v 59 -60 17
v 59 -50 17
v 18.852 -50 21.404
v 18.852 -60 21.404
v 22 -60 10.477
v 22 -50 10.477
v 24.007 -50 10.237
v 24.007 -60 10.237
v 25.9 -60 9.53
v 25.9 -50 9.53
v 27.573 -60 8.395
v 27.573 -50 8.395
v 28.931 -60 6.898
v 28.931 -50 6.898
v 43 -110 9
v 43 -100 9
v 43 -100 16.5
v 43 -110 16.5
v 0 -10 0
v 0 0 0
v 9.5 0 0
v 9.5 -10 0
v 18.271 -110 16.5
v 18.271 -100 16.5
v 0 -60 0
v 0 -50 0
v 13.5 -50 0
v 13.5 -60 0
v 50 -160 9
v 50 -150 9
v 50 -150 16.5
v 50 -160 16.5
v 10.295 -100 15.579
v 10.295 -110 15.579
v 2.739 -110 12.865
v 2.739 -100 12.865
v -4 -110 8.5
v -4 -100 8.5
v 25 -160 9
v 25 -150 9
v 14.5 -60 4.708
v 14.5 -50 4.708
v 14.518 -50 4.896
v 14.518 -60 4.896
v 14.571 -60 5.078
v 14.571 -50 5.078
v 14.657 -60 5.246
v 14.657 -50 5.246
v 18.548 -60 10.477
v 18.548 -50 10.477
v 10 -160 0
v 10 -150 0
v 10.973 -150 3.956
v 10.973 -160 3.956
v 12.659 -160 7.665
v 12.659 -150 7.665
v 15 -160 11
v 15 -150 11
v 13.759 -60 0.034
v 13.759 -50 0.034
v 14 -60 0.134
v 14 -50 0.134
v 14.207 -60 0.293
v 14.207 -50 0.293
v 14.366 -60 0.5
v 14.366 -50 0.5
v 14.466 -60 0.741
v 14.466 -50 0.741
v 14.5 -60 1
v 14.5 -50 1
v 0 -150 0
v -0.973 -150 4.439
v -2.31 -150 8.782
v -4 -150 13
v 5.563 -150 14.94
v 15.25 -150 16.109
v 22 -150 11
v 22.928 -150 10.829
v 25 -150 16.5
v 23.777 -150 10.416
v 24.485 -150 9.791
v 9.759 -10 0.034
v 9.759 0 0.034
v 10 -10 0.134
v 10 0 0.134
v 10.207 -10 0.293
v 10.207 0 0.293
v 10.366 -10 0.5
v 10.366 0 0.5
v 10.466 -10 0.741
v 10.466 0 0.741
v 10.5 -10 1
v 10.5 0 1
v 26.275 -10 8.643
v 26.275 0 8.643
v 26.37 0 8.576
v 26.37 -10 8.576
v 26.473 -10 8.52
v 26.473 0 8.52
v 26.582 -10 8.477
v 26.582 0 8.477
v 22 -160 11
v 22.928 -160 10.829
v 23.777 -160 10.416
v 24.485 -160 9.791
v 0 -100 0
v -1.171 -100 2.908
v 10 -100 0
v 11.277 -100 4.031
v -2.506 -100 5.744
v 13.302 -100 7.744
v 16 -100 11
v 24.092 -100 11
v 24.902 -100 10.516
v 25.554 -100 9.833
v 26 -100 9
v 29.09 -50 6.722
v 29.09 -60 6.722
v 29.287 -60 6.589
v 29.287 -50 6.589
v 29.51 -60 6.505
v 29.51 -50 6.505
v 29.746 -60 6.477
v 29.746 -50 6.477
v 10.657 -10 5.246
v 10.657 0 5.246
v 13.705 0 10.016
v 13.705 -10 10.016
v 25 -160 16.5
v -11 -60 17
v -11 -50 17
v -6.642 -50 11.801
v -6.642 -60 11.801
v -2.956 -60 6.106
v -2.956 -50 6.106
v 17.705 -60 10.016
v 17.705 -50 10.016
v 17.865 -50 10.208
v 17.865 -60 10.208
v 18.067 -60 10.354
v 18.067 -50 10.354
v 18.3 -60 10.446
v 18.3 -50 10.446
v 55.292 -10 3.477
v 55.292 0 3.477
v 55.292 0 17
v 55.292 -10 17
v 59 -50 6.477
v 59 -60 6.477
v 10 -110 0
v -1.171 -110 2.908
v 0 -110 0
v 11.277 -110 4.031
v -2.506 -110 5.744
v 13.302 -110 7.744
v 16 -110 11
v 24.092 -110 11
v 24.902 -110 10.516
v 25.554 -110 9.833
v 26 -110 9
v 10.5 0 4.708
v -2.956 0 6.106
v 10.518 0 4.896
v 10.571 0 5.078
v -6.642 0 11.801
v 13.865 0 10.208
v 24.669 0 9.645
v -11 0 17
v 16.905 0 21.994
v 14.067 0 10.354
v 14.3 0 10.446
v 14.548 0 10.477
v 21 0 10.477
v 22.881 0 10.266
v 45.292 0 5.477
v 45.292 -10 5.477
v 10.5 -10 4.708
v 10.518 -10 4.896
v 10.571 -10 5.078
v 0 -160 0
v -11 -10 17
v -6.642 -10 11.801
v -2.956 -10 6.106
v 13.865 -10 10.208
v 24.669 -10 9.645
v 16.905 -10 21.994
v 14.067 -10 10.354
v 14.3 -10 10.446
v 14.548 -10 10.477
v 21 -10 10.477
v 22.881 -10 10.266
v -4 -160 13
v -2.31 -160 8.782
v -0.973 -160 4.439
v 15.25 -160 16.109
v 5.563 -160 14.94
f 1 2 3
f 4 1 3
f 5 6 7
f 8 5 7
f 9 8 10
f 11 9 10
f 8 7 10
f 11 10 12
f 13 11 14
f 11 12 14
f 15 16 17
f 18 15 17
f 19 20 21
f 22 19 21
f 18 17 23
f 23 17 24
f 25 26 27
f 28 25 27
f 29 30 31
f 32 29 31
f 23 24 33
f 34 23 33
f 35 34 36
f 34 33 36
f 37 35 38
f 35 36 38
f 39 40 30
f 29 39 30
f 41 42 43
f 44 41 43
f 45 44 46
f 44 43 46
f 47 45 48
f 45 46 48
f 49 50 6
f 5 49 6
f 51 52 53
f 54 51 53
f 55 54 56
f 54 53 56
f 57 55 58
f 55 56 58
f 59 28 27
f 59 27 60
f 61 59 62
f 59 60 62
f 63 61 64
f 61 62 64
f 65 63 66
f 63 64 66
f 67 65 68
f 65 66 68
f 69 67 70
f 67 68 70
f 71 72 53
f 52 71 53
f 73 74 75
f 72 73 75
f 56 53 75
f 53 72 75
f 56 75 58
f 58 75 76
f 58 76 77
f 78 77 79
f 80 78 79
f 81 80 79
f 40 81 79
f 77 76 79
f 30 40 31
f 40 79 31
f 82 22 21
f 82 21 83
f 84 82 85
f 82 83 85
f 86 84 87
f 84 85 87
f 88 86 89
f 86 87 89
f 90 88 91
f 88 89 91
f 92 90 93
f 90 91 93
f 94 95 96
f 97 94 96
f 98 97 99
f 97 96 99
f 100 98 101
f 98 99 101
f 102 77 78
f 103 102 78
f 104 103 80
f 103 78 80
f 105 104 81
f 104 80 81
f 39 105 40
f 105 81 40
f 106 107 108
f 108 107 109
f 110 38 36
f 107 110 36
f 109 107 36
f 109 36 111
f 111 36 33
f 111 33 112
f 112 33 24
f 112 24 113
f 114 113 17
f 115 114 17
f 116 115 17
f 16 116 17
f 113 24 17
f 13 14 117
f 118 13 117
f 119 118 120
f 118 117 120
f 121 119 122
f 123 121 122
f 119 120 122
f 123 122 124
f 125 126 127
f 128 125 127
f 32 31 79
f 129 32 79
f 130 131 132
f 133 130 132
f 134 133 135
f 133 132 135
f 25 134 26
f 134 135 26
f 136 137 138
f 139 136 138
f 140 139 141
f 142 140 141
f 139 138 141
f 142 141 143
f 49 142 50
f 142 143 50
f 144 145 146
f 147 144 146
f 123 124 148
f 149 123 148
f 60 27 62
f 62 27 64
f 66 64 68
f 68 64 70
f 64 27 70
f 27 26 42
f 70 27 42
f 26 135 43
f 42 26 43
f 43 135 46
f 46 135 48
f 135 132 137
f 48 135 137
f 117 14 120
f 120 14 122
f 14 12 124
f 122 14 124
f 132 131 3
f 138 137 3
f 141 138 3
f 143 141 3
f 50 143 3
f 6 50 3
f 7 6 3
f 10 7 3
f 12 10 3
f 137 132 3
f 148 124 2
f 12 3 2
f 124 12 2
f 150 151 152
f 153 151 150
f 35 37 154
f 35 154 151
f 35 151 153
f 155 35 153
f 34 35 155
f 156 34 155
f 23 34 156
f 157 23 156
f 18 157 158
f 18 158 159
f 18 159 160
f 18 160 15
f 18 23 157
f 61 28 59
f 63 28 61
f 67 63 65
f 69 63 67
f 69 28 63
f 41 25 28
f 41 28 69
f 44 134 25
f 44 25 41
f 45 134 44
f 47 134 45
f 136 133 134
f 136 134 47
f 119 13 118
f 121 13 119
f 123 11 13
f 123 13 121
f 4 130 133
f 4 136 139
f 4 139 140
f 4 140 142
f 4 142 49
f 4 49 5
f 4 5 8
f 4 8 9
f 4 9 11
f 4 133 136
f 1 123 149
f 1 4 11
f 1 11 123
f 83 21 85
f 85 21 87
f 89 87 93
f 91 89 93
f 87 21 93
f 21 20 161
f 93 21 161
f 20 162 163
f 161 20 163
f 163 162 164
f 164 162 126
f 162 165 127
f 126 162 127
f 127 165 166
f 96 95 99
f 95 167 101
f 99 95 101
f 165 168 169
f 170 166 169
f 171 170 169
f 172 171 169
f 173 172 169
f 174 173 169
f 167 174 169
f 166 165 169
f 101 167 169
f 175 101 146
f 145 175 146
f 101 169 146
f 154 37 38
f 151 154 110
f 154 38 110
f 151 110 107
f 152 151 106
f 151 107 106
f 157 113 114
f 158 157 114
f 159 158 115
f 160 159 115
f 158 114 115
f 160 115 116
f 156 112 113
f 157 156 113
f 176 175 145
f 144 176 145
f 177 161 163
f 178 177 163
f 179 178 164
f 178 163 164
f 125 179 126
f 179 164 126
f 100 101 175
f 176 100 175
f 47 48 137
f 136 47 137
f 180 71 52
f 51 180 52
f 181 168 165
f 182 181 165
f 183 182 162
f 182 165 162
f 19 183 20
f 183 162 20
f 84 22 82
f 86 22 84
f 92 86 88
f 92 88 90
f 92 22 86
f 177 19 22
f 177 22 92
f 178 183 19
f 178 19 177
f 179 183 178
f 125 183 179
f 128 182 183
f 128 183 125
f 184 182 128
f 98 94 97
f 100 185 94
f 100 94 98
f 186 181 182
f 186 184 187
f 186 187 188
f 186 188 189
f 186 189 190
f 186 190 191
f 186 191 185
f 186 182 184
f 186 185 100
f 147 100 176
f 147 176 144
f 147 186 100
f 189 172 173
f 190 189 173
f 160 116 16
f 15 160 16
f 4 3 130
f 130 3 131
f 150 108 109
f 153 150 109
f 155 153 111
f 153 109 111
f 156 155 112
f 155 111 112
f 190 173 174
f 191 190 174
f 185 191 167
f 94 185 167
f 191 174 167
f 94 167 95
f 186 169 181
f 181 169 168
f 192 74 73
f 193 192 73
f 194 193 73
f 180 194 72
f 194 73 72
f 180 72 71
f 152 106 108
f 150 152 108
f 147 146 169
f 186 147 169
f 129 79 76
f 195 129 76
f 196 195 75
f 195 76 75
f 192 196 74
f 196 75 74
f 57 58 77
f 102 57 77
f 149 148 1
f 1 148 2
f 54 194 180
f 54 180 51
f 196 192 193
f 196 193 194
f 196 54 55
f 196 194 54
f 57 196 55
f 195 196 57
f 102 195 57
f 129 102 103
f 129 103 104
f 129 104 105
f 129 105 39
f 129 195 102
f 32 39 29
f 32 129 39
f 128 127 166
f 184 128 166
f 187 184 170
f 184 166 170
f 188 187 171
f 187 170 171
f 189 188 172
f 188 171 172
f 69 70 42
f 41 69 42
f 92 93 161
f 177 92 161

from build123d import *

# Parameters (mm, degrees)
F1_DEPTH  = 10
F4_DEPTH  = 10
F7_DEPTH  = 10
F10_DEPTH = 10


with BuildPart() as f1:
    # F0 (on Front) → F1 (new body)
    with BuildSketch(Plane.XZ):
        with BuildLine():
            ThreePointArc((-11, 17), (-4.710931, 9.010574), (0, 0))
            Line((0, 0), (9.5, 0))
            ThreePointArc((9.5, 0), (10.207107, 0.292893), (10.5, 1))
            Line((10.5, 1), (10.5, 4.707779))
            ThreePointArc((10.5, 4.707779), (10.540143, 4.988269), (10.65735, 5.24624))
            Line((10.65735, 5.24624), (13.705072, 10.015687))
            ThreePointArc((13.705072, 10.015687), (14.067338, 10.354284), (14.547723, 10.477226))
            Line((14.547723, 10.477226), (21, 10.477226))
            ThreePointArc((21, 10.477226), (23.792353, 10.005474), (26.274753, 8.642582))
            ThreePointArc((26.274753, 8.642582), (26.420907, 8.546435), (26.581581, 8.47723))
            Line((26.581581, 8.47723), (45.291543, 5.47723))
            Line((45.291543, 5.47723), (55.291543, 3.47723))
            Line((55.291543, 3.47723), (55.291543, 17))
            Line((55.291543, 17), (16.90484, 21.994406))
            Line((16.90484, 21.994406), (-11, 17))
        make_face()
    extrude(amount=F1_DEPTH)


with BuildPart() as f4:
    # F3 (on offset) → F4 (new body)
    with BuildSketch(Plane.XZ.offset(50)):
        with BuildLine():
            ThreePointArc((-11, 17), (-4.710931, 9.010574), (0, 0))
            Line((0, 0), (13.5, 0))
            ThreePointArc((13.5, 0), (14.207107, 0.292893), (14.5, 1))
            Line((14.5, 1), (14.5, 4.707779))
            ThreePointArc((14.5, 4.707779), (14.540143, 4.988269), (14.65735, 5.24624))
            Line((14.65735, 5.24624), (17.705072, 10.015687))
            ThreePointArc((17.705072, 10.015687), (18.067338, 10.354284), (18.547723, 10.477226))
            Line((18.547723, 10.477226), (22, 10.477226))
            ThreePointArc((22, 10.477226), (25.900067, 9.529674), (28.930602, 6.898278))
            ThreePointArc((28.930602, 6.898278), (29.287135, 6.588702), (29.745967, 6.477226))
            Line((29.745967, 6.477226), (59, 6.477226))
            Line((59, 6.477226), (59, 17))
            Line((59, 17), (18.85245, 21.403823))
            Line((18.85245, 21.403823), (-11, 17))
        make_face()
    extrude(amount=F4_DEPTH)


with BuildPart() as f7:
    # F6 (on offset) → F7 (new body)
    with BuildSketch(Plane.XZ.offset(100)):
        with BuildLine():
            ThreePointArc((-4, 8.5), (-1.81819, 4.335558), (0, 0))
            Line((0, 0), (10, 0))
            ThreePointArc((10, 0), (12.200322, 5.936188), (16, 11))
            Line((16, 11), (24.091514, 11))
            ThreePointArc((24.091514, 11), (25.251585, 10.19641), (26, 9))
            Line((26, 9), (43, 9))
            Line((43, 9), (43, 16.5))
            Line((43, 16.5), (18.271057, 16.5))
            ThreePointArc((18.271057, 16.5), (6.438898, 14.439338), (-4, 8.5))
        make_face()
    extrude(amount=F7_DEPTH)


with BuildPart() as f10:
    # F9 (on offset) → F10 (new body)
    with BuildSketch(Plane.XZ.offset(150)):
        with BuildLine():
            ThreePointArc((-4, 13), (-1.59659, 6.624126), (0, 0))
            Line((0, 0), (10, 0))
            ThreePointArc((10, 0), (11.730008, 5.849996), (15, 11))
            Line((15, 11), (22, 11))
            Line((22, 11), (25, 11))
            Line((25, 11), (25, 16.5))
            ThreePointArc((25, 16.5), (10.394778, 15.621837), (-4, 13))
        make_face()
        Polygon((50, 16.5), (25, 16.5), (25, 11), (25, 9), (50, 9), align=None)
        with BuildLine():
            Line((25, 9), (25, 11))
            Line((25, 11), (22, 11))
            ThreePointArc((22, 11), (23.77735, 10.416025), (25, 9))
        make_face()
    extrude(amount=F10_DEPTH)


solid = Compound([f1.part, f4.part, f7.part, f10.part])
